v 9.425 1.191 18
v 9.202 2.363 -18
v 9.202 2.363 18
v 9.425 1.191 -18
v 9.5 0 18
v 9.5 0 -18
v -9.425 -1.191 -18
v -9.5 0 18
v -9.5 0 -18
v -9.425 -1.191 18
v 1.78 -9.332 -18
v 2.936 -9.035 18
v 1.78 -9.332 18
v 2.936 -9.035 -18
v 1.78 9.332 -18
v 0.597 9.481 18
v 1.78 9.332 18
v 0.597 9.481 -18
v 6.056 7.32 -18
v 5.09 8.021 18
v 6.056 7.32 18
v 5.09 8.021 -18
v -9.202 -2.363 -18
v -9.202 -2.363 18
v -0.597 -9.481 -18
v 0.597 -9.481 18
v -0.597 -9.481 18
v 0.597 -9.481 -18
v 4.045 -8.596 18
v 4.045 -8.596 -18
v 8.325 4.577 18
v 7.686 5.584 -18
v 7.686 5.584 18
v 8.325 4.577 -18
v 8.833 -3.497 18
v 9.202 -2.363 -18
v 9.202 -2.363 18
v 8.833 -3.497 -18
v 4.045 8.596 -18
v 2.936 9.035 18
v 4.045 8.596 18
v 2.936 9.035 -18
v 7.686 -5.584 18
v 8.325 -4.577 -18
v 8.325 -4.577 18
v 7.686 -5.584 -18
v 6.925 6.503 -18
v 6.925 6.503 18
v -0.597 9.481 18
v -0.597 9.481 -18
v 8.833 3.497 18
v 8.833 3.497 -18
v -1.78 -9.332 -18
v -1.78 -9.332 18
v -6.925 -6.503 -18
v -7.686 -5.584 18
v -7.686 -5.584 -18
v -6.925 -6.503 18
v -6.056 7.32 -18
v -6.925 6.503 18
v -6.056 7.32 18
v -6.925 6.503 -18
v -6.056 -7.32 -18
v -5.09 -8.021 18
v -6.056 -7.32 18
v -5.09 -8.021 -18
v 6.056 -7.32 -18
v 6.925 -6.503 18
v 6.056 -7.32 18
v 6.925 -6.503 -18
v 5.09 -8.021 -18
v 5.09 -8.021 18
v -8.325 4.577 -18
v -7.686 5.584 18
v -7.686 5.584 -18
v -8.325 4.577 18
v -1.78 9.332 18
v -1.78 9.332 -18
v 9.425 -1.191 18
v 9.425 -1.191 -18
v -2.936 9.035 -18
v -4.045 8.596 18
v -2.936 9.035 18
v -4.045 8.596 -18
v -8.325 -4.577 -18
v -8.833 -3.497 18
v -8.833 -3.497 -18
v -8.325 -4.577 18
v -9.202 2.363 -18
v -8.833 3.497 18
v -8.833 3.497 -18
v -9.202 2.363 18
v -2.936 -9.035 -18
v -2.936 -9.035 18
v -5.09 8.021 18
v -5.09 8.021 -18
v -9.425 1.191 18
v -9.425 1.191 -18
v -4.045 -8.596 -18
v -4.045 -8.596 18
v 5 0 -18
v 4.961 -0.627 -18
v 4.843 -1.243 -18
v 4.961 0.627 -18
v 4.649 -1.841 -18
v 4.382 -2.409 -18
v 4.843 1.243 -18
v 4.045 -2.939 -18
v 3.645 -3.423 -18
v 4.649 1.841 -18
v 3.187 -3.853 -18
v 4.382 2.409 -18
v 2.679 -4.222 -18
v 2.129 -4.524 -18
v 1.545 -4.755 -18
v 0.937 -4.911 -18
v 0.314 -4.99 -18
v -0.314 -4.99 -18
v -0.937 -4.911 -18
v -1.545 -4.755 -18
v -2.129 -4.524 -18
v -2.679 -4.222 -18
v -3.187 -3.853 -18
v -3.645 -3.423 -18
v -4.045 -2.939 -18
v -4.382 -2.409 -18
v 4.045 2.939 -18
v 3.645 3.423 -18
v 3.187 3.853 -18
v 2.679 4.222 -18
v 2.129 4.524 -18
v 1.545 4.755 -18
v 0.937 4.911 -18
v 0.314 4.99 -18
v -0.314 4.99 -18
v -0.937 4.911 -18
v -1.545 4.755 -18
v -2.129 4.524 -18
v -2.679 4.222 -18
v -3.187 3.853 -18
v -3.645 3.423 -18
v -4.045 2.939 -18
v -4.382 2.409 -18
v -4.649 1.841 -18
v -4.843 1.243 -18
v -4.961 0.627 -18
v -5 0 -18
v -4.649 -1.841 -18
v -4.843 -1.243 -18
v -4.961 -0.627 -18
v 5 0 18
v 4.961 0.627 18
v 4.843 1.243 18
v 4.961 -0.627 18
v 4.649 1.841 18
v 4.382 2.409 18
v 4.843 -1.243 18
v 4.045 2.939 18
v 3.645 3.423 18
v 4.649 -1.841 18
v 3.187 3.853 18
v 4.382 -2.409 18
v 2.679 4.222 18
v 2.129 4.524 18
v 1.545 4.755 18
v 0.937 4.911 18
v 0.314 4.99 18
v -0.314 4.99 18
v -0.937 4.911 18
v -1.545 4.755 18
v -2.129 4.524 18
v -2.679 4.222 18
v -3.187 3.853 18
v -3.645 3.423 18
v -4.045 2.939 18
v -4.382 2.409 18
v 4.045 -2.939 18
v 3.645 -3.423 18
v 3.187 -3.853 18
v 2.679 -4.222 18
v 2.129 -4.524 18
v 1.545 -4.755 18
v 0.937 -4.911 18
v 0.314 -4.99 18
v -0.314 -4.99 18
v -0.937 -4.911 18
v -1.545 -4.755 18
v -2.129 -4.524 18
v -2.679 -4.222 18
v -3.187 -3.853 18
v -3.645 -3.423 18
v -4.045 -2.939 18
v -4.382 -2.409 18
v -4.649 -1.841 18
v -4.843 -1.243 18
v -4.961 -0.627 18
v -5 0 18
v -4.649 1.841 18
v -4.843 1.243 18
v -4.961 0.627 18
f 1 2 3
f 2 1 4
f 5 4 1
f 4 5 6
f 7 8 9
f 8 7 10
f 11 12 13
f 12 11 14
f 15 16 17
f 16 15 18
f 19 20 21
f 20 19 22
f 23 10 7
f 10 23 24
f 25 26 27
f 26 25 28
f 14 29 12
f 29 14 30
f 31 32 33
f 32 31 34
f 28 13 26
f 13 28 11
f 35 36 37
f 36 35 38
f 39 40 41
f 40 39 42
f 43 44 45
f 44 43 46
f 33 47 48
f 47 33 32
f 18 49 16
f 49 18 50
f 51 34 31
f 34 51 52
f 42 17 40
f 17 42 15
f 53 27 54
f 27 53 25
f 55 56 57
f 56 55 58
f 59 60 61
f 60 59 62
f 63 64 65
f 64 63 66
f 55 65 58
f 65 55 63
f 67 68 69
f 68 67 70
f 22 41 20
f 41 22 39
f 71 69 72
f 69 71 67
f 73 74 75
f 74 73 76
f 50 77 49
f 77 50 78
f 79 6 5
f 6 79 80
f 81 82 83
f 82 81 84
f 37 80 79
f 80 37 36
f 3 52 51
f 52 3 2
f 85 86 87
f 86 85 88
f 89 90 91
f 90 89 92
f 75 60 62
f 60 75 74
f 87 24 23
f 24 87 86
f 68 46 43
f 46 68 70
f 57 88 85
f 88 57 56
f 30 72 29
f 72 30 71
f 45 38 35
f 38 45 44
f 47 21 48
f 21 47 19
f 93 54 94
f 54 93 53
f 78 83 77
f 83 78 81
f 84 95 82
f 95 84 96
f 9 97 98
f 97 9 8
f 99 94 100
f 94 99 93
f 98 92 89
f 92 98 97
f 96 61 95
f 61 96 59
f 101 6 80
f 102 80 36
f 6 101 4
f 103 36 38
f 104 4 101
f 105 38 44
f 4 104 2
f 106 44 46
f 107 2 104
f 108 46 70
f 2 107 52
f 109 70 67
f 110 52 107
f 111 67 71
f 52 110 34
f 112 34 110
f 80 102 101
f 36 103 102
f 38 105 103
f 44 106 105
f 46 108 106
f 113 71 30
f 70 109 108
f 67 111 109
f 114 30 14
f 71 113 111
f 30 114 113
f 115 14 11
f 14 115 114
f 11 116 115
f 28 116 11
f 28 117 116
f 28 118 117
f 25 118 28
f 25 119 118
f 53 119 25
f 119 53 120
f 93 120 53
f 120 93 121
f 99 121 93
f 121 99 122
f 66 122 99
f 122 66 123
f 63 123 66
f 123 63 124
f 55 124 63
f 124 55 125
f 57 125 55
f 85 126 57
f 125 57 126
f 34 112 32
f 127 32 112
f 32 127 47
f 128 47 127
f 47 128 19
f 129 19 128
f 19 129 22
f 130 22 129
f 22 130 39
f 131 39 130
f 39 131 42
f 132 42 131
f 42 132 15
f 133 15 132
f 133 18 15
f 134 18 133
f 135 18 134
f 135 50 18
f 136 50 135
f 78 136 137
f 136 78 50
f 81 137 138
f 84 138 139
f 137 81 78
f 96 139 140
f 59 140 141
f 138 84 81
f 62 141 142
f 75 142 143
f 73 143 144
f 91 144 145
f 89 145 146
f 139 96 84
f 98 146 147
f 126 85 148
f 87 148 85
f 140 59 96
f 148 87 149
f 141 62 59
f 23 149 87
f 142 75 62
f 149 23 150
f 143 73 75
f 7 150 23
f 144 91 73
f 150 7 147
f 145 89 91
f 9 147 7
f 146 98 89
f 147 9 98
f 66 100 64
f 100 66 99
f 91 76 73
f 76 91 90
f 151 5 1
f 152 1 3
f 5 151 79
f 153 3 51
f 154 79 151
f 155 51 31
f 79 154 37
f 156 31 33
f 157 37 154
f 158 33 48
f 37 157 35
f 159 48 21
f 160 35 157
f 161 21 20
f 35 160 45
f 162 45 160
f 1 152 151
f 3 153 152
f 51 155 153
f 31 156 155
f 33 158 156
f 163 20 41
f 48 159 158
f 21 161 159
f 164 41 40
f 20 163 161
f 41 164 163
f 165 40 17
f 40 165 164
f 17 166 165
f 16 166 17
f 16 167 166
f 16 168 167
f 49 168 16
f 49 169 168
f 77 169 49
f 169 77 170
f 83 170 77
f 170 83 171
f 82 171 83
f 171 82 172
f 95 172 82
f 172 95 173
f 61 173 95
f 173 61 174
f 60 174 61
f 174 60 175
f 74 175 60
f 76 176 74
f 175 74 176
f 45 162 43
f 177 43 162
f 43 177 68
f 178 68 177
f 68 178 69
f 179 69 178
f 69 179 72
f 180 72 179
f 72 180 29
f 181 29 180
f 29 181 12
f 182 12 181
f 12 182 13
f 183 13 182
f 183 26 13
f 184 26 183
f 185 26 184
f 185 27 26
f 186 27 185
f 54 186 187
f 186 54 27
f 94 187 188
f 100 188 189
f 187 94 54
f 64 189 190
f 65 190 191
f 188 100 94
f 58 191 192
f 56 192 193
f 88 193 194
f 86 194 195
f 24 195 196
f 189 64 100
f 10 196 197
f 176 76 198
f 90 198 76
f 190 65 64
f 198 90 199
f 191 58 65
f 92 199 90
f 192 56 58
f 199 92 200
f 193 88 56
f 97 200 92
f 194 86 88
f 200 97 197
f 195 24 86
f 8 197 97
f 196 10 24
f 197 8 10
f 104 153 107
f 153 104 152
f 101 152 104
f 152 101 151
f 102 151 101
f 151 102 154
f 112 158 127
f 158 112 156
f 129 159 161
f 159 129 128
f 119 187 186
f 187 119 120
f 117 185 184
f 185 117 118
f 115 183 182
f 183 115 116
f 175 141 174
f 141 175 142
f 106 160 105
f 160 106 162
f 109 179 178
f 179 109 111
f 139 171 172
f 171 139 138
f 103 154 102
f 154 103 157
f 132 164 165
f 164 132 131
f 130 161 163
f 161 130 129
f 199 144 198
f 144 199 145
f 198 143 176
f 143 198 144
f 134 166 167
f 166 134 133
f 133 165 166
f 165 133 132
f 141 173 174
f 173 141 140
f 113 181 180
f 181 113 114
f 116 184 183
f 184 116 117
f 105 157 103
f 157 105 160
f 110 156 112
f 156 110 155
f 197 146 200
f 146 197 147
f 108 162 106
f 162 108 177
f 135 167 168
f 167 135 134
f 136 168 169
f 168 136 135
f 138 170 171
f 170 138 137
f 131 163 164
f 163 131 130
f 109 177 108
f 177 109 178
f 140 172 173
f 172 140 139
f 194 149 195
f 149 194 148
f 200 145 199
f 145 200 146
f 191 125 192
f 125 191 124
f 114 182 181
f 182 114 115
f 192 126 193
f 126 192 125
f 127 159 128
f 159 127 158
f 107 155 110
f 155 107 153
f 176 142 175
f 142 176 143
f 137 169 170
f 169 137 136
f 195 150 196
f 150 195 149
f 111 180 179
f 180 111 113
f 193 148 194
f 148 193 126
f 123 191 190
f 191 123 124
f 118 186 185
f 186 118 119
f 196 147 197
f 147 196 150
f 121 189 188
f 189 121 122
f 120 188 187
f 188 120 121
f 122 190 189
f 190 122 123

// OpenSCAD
$fn = 50;


difference() {
	union() {
		translate(v = [0, 0, -18.0000000000]) {
			cylinder(h = 36, r = 9.5000000000);
		}
	}
	union() {
		translate(v = [0, 0, -100.0000000000]) {
			cylinder(h = 200, r = 5.0000000000);
		}
	}
}
